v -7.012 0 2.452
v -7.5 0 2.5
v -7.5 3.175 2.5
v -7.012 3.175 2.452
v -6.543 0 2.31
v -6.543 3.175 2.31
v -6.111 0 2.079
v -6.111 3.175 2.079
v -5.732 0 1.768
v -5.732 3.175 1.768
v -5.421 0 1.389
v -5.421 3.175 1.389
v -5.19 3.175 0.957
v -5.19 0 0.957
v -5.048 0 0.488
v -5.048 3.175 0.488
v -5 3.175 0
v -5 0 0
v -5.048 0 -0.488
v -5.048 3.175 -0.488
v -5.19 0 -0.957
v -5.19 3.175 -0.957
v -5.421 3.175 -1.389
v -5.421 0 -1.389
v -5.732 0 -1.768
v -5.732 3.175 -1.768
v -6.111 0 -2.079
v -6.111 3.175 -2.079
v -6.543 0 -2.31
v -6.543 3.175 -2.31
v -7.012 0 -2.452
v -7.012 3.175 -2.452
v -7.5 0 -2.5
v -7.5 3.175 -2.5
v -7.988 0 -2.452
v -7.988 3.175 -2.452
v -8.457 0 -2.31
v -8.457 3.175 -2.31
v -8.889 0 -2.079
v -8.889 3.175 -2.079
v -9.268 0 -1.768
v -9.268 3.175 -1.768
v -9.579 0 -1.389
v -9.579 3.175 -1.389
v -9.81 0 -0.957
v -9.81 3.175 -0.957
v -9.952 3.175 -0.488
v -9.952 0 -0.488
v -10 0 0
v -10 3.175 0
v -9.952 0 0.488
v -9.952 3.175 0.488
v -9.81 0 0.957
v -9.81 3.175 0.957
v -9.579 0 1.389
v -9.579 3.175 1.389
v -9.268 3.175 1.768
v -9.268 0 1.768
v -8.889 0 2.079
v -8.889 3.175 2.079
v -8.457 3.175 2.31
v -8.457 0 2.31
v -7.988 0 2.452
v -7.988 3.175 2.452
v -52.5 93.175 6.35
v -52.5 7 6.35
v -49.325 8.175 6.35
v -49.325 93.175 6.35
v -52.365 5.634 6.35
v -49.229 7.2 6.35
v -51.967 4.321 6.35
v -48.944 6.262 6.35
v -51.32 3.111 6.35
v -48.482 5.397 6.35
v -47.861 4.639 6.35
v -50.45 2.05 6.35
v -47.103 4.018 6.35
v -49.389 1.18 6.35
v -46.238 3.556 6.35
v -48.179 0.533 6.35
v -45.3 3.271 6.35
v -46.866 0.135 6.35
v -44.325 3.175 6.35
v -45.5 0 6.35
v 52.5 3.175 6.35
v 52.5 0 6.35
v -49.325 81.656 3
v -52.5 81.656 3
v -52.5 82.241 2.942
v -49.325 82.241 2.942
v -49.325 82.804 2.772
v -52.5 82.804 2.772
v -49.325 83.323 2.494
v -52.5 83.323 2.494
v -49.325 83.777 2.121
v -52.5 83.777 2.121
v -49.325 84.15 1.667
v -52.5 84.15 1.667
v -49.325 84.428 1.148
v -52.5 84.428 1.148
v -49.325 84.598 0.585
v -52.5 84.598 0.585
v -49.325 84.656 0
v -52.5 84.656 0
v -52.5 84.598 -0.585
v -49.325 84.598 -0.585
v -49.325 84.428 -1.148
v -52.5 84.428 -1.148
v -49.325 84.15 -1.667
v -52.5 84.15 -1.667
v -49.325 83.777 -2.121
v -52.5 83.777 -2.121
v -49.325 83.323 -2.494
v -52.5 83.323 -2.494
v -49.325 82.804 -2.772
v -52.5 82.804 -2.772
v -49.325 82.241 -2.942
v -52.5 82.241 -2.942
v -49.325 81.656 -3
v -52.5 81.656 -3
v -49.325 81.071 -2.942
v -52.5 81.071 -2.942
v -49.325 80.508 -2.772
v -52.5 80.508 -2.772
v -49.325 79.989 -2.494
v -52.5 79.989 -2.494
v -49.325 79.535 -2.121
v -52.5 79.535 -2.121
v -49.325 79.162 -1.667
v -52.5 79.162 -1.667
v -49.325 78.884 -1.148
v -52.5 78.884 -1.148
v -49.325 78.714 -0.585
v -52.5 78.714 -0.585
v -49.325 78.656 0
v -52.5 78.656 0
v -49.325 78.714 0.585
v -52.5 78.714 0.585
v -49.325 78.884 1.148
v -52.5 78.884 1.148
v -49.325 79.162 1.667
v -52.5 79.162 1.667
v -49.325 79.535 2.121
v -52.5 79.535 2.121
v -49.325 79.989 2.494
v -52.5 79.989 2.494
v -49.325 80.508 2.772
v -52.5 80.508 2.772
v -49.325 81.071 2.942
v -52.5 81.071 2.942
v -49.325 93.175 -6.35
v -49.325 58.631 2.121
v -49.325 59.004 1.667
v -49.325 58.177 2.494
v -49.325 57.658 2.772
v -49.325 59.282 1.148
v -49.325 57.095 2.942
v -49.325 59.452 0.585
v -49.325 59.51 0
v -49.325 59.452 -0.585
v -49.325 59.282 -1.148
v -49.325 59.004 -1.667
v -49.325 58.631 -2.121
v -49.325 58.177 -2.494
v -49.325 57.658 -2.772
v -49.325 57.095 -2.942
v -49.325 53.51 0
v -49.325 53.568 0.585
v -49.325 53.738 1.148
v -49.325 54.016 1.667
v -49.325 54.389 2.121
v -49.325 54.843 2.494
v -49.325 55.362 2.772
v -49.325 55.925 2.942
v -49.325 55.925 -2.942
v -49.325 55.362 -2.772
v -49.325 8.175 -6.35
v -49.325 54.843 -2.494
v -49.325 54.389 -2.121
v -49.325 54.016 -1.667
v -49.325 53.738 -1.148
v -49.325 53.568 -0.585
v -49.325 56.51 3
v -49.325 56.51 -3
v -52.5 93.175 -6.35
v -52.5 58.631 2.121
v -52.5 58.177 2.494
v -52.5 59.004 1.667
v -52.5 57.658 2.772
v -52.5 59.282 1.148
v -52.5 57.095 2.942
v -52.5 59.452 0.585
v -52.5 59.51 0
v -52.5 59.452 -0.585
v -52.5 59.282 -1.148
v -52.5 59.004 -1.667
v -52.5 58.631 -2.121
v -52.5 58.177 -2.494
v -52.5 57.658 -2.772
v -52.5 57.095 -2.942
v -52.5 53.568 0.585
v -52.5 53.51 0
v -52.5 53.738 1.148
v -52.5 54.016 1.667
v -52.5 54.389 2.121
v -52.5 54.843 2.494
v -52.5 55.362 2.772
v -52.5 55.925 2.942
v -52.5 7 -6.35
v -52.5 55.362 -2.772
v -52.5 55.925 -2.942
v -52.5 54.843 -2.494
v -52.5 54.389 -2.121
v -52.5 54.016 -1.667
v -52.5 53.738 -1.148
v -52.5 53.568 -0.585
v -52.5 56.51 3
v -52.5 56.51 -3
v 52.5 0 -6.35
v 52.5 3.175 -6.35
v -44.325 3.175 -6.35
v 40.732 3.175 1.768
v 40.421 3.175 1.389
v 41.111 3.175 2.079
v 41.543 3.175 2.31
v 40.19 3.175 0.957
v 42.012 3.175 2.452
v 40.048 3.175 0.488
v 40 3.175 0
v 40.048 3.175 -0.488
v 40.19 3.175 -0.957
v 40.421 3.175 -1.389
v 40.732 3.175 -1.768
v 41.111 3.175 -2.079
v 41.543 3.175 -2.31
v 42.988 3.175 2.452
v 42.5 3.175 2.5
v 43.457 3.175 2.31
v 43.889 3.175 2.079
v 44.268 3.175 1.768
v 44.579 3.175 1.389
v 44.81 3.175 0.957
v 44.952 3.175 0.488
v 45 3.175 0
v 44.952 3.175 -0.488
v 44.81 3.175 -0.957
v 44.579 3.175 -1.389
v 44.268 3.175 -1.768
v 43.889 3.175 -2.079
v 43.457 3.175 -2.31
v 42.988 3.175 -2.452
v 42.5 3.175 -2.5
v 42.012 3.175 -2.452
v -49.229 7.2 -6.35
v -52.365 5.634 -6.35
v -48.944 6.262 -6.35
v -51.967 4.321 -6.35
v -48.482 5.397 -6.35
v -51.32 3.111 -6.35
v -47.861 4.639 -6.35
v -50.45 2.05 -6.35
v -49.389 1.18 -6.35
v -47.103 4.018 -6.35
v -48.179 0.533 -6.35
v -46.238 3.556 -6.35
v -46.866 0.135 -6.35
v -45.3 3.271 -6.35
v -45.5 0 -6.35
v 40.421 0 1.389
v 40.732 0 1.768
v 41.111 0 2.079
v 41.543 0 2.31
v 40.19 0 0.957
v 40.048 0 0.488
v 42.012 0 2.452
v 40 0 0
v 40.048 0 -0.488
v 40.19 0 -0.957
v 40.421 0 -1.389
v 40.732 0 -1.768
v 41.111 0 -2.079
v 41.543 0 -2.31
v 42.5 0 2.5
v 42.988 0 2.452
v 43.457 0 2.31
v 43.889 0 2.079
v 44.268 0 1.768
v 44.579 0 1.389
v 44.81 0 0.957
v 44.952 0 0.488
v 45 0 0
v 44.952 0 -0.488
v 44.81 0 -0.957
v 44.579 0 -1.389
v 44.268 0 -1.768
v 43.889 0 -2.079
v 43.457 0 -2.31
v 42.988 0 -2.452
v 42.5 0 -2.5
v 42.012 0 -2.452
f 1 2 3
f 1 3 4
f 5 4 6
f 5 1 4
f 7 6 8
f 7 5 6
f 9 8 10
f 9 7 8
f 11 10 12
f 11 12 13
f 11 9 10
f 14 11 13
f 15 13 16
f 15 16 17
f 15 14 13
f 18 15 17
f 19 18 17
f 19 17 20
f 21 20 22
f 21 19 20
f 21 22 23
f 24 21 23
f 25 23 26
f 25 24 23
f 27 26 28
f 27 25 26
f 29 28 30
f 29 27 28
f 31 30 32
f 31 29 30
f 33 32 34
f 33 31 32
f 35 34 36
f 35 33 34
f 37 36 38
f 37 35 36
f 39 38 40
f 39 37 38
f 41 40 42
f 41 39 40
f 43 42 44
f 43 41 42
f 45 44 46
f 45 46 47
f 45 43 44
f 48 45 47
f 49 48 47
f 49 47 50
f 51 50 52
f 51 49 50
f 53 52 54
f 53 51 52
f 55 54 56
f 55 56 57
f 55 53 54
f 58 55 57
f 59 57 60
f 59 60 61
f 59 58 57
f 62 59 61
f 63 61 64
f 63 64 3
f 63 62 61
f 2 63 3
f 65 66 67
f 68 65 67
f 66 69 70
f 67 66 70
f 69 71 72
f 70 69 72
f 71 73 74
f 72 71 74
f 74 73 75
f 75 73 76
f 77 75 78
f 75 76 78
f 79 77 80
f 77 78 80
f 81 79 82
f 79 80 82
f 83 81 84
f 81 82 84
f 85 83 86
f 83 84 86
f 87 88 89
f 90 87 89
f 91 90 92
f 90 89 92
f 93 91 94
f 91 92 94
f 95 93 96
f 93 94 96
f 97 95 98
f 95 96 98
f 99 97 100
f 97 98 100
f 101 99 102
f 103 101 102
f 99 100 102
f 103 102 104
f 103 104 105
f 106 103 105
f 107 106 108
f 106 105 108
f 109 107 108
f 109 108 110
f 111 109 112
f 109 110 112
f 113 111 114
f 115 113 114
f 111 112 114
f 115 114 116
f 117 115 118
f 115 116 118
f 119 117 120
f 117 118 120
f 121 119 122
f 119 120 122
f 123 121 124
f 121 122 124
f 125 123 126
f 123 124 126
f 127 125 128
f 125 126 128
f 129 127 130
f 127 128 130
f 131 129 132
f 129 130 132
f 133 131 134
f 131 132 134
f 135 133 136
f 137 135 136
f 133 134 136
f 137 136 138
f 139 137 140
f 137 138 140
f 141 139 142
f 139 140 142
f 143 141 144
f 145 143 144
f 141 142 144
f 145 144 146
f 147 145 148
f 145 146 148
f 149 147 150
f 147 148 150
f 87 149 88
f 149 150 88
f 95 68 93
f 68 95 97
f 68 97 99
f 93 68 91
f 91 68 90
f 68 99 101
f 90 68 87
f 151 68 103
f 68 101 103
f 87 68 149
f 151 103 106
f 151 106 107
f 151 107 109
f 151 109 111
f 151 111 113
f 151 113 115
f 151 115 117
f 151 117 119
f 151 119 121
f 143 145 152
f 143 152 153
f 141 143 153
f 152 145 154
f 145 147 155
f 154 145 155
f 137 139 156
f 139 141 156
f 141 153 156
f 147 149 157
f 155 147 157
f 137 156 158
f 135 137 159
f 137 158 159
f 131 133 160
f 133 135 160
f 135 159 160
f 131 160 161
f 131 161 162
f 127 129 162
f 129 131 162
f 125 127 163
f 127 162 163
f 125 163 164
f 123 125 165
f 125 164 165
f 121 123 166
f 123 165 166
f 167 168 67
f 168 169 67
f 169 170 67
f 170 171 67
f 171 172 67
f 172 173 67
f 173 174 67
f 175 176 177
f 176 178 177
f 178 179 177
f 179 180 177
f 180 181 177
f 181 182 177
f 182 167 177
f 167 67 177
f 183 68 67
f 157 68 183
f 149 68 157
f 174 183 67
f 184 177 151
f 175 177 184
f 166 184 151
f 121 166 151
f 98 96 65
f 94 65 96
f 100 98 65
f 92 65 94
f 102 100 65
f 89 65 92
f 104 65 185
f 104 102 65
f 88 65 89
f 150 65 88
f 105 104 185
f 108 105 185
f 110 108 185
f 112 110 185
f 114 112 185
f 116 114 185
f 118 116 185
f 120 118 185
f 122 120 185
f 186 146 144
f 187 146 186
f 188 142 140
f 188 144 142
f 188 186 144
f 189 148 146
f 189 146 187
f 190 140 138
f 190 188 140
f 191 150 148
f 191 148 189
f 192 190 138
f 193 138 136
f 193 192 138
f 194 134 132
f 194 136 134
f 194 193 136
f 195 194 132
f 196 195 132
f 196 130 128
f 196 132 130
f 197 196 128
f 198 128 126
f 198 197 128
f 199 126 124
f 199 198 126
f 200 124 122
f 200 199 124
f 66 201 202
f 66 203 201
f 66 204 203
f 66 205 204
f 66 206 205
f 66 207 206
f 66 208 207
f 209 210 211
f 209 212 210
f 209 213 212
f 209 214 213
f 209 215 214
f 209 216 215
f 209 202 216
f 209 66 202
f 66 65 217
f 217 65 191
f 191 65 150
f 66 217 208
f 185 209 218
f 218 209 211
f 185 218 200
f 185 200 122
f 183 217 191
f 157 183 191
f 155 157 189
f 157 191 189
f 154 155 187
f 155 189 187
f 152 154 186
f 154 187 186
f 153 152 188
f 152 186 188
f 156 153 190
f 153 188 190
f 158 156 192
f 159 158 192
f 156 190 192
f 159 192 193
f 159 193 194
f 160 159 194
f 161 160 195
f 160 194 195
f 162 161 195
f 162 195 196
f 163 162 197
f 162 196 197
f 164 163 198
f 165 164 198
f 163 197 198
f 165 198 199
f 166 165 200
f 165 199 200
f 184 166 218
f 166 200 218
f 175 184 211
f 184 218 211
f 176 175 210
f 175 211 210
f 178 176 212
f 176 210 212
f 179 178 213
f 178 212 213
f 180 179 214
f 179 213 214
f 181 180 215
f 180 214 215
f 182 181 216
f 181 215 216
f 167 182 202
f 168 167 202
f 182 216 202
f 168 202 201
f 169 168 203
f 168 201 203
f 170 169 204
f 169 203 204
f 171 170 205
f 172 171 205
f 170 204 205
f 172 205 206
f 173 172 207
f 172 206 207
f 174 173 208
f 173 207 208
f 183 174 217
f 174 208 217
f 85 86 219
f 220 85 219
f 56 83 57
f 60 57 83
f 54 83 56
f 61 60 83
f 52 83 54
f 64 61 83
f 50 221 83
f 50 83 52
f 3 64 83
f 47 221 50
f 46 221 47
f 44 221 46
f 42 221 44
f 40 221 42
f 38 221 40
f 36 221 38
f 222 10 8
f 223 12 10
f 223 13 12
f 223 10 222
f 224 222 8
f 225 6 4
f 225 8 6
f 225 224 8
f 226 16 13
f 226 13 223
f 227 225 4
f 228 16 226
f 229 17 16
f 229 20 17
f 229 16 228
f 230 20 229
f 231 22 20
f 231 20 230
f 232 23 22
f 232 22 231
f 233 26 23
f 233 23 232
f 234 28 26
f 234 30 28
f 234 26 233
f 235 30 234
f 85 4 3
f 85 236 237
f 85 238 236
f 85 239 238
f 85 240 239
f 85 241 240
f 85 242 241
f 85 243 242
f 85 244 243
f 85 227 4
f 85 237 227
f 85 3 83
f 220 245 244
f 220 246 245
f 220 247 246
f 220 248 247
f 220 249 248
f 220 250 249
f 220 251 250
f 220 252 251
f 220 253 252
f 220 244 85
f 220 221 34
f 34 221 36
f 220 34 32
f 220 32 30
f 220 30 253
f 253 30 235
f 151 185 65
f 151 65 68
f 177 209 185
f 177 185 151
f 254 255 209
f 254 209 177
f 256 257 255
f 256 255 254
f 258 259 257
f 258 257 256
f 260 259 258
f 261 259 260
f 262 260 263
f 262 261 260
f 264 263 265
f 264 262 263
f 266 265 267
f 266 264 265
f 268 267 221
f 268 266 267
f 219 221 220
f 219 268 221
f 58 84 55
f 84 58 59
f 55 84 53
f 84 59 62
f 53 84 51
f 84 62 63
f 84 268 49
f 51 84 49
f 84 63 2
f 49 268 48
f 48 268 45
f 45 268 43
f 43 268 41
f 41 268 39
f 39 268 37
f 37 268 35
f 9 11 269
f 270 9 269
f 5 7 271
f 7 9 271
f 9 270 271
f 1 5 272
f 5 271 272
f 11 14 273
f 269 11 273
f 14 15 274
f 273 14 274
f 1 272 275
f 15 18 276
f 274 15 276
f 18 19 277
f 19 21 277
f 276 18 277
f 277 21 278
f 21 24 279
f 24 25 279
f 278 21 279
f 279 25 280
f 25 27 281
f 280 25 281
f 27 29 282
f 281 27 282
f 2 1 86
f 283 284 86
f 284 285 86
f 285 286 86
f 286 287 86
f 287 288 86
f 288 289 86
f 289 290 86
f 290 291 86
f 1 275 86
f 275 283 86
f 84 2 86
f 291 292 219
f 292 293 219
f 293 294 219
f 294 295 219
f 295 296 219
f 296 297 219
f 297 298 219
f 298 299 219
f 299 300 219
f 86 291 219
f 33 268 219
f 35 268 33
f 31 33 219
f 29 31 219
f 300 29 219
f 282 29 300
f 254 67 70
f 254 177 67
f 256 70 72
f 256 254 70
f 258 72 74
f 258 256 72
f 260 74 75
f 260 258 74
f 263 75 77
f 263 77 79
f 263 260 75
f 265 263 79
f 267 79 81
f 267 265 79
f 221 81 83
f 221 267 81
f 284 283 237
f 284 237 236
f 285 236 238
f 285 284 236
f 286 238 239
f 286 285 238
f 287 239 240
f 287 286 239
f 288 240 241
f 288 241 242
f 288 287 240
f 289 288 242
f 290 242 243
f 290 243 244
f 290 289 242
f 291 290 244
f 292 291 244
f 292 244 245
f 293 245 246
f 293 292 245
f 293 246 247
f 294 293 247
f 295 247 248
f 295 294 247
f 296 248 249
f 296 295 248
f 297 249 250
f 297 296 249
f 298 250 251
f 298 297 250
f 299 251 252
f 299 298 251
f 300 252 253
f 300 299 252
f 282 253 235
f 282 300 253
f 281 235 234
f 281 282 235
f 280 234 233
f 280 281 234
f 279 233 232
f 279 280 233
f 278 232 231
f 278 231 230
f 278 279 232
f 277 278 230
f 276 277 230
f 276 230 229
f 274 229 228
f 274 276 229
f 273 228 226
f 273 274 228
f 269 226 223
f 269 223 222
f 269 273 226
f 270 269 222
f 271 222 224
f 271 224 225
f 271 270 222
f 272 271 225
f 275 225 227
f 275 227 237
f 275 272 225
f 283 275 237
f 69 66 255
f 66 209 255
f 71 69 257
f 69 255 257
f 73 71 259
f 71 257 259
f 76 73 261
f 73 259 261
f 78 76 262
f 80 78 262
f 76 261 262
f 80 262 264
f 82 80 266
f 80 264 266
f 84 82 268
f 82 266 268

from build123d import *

# Parameters (mm, degrees)
SKETCH1_W           = 105
SKETCH1_H           = 12.7
SKETCH1_R           = 2.5
BOSS_EXTRUDE1_DEPTH = 3.175
SKETCH2_W           = 3.175
SKETCH2_H           = 12.7
BOSS_EXTRUDE2_DEPTH = 90
SKETCH3_R           = 3
CUT_EXTRUDE1_DEPTH  = 3.175
FILLET1_R           = 5
FILLET2_R           = 7


with BuildPart() as part:
    # Sketch1 → Boss-Extrude1 (new body)
    with BuildSketch(Plane(origin=(0, 0, 0), x_dir=(1, 0, 0), z_dir=(0, 1, 0))):
        Rectangle(SKETCH1_W, SKETCH1_H)
        with Locations(Location((42.5, 0, 0), (0, 0, 270))):
            Circle(SKETCH1_R, mode=Mode.SUBTRACT)
        with Locations(Location((-7.5, 0, 0), (0, 0, 270))):
            Circle(SKETCH1_R, mode=Mode.SUBTRACT)
    extrude(amount=BOSS_EXTRUDE1_DEPTH)

    # Sketch2 → Boss-Extrude2 (add)
    with BuildSketch(Plane(origin=(0, 3.175, 0), x_dir=(1, 0, 0), z_dir=(0, 1, 0))):
        with Locations((-50.9125, 0)):
            Rectangle(SKETCH2_W, SKETCH2_H)
    extrude(amount=BOSS_EXTRUDE2_DEPTH)

    # Sketch3 → Cut-Extrude1 (cut)
    with BuildSketch(Plane.ZY.offset(52.5)):
        with Locations((0, 56.51)):
            Circle(SKETCH3_R)
        with Locations((0, 81.656)):
            Circle(SKETCH3_R)
    extrude(amount=-CUT_EXTRUDE1_DEPTH, mode=Mode.SUBTRACT)

    # Fillet1
    fillet1_edges = [part.edges().sort_by_distance(p)[0] for p in [
        (-49.325, 3.175, 0),
    ]]
    fillet(fillet1_edges, radius=FILLET1_R)

    # Fillet2
    fillet2_edges = [part.edges().sort_by_distance(p)[0] for p in [
        (-52.5, 0, 0),
    ]]
    fillet(fillet2_edges, radius=FILLET2_R)


solid = part.part
